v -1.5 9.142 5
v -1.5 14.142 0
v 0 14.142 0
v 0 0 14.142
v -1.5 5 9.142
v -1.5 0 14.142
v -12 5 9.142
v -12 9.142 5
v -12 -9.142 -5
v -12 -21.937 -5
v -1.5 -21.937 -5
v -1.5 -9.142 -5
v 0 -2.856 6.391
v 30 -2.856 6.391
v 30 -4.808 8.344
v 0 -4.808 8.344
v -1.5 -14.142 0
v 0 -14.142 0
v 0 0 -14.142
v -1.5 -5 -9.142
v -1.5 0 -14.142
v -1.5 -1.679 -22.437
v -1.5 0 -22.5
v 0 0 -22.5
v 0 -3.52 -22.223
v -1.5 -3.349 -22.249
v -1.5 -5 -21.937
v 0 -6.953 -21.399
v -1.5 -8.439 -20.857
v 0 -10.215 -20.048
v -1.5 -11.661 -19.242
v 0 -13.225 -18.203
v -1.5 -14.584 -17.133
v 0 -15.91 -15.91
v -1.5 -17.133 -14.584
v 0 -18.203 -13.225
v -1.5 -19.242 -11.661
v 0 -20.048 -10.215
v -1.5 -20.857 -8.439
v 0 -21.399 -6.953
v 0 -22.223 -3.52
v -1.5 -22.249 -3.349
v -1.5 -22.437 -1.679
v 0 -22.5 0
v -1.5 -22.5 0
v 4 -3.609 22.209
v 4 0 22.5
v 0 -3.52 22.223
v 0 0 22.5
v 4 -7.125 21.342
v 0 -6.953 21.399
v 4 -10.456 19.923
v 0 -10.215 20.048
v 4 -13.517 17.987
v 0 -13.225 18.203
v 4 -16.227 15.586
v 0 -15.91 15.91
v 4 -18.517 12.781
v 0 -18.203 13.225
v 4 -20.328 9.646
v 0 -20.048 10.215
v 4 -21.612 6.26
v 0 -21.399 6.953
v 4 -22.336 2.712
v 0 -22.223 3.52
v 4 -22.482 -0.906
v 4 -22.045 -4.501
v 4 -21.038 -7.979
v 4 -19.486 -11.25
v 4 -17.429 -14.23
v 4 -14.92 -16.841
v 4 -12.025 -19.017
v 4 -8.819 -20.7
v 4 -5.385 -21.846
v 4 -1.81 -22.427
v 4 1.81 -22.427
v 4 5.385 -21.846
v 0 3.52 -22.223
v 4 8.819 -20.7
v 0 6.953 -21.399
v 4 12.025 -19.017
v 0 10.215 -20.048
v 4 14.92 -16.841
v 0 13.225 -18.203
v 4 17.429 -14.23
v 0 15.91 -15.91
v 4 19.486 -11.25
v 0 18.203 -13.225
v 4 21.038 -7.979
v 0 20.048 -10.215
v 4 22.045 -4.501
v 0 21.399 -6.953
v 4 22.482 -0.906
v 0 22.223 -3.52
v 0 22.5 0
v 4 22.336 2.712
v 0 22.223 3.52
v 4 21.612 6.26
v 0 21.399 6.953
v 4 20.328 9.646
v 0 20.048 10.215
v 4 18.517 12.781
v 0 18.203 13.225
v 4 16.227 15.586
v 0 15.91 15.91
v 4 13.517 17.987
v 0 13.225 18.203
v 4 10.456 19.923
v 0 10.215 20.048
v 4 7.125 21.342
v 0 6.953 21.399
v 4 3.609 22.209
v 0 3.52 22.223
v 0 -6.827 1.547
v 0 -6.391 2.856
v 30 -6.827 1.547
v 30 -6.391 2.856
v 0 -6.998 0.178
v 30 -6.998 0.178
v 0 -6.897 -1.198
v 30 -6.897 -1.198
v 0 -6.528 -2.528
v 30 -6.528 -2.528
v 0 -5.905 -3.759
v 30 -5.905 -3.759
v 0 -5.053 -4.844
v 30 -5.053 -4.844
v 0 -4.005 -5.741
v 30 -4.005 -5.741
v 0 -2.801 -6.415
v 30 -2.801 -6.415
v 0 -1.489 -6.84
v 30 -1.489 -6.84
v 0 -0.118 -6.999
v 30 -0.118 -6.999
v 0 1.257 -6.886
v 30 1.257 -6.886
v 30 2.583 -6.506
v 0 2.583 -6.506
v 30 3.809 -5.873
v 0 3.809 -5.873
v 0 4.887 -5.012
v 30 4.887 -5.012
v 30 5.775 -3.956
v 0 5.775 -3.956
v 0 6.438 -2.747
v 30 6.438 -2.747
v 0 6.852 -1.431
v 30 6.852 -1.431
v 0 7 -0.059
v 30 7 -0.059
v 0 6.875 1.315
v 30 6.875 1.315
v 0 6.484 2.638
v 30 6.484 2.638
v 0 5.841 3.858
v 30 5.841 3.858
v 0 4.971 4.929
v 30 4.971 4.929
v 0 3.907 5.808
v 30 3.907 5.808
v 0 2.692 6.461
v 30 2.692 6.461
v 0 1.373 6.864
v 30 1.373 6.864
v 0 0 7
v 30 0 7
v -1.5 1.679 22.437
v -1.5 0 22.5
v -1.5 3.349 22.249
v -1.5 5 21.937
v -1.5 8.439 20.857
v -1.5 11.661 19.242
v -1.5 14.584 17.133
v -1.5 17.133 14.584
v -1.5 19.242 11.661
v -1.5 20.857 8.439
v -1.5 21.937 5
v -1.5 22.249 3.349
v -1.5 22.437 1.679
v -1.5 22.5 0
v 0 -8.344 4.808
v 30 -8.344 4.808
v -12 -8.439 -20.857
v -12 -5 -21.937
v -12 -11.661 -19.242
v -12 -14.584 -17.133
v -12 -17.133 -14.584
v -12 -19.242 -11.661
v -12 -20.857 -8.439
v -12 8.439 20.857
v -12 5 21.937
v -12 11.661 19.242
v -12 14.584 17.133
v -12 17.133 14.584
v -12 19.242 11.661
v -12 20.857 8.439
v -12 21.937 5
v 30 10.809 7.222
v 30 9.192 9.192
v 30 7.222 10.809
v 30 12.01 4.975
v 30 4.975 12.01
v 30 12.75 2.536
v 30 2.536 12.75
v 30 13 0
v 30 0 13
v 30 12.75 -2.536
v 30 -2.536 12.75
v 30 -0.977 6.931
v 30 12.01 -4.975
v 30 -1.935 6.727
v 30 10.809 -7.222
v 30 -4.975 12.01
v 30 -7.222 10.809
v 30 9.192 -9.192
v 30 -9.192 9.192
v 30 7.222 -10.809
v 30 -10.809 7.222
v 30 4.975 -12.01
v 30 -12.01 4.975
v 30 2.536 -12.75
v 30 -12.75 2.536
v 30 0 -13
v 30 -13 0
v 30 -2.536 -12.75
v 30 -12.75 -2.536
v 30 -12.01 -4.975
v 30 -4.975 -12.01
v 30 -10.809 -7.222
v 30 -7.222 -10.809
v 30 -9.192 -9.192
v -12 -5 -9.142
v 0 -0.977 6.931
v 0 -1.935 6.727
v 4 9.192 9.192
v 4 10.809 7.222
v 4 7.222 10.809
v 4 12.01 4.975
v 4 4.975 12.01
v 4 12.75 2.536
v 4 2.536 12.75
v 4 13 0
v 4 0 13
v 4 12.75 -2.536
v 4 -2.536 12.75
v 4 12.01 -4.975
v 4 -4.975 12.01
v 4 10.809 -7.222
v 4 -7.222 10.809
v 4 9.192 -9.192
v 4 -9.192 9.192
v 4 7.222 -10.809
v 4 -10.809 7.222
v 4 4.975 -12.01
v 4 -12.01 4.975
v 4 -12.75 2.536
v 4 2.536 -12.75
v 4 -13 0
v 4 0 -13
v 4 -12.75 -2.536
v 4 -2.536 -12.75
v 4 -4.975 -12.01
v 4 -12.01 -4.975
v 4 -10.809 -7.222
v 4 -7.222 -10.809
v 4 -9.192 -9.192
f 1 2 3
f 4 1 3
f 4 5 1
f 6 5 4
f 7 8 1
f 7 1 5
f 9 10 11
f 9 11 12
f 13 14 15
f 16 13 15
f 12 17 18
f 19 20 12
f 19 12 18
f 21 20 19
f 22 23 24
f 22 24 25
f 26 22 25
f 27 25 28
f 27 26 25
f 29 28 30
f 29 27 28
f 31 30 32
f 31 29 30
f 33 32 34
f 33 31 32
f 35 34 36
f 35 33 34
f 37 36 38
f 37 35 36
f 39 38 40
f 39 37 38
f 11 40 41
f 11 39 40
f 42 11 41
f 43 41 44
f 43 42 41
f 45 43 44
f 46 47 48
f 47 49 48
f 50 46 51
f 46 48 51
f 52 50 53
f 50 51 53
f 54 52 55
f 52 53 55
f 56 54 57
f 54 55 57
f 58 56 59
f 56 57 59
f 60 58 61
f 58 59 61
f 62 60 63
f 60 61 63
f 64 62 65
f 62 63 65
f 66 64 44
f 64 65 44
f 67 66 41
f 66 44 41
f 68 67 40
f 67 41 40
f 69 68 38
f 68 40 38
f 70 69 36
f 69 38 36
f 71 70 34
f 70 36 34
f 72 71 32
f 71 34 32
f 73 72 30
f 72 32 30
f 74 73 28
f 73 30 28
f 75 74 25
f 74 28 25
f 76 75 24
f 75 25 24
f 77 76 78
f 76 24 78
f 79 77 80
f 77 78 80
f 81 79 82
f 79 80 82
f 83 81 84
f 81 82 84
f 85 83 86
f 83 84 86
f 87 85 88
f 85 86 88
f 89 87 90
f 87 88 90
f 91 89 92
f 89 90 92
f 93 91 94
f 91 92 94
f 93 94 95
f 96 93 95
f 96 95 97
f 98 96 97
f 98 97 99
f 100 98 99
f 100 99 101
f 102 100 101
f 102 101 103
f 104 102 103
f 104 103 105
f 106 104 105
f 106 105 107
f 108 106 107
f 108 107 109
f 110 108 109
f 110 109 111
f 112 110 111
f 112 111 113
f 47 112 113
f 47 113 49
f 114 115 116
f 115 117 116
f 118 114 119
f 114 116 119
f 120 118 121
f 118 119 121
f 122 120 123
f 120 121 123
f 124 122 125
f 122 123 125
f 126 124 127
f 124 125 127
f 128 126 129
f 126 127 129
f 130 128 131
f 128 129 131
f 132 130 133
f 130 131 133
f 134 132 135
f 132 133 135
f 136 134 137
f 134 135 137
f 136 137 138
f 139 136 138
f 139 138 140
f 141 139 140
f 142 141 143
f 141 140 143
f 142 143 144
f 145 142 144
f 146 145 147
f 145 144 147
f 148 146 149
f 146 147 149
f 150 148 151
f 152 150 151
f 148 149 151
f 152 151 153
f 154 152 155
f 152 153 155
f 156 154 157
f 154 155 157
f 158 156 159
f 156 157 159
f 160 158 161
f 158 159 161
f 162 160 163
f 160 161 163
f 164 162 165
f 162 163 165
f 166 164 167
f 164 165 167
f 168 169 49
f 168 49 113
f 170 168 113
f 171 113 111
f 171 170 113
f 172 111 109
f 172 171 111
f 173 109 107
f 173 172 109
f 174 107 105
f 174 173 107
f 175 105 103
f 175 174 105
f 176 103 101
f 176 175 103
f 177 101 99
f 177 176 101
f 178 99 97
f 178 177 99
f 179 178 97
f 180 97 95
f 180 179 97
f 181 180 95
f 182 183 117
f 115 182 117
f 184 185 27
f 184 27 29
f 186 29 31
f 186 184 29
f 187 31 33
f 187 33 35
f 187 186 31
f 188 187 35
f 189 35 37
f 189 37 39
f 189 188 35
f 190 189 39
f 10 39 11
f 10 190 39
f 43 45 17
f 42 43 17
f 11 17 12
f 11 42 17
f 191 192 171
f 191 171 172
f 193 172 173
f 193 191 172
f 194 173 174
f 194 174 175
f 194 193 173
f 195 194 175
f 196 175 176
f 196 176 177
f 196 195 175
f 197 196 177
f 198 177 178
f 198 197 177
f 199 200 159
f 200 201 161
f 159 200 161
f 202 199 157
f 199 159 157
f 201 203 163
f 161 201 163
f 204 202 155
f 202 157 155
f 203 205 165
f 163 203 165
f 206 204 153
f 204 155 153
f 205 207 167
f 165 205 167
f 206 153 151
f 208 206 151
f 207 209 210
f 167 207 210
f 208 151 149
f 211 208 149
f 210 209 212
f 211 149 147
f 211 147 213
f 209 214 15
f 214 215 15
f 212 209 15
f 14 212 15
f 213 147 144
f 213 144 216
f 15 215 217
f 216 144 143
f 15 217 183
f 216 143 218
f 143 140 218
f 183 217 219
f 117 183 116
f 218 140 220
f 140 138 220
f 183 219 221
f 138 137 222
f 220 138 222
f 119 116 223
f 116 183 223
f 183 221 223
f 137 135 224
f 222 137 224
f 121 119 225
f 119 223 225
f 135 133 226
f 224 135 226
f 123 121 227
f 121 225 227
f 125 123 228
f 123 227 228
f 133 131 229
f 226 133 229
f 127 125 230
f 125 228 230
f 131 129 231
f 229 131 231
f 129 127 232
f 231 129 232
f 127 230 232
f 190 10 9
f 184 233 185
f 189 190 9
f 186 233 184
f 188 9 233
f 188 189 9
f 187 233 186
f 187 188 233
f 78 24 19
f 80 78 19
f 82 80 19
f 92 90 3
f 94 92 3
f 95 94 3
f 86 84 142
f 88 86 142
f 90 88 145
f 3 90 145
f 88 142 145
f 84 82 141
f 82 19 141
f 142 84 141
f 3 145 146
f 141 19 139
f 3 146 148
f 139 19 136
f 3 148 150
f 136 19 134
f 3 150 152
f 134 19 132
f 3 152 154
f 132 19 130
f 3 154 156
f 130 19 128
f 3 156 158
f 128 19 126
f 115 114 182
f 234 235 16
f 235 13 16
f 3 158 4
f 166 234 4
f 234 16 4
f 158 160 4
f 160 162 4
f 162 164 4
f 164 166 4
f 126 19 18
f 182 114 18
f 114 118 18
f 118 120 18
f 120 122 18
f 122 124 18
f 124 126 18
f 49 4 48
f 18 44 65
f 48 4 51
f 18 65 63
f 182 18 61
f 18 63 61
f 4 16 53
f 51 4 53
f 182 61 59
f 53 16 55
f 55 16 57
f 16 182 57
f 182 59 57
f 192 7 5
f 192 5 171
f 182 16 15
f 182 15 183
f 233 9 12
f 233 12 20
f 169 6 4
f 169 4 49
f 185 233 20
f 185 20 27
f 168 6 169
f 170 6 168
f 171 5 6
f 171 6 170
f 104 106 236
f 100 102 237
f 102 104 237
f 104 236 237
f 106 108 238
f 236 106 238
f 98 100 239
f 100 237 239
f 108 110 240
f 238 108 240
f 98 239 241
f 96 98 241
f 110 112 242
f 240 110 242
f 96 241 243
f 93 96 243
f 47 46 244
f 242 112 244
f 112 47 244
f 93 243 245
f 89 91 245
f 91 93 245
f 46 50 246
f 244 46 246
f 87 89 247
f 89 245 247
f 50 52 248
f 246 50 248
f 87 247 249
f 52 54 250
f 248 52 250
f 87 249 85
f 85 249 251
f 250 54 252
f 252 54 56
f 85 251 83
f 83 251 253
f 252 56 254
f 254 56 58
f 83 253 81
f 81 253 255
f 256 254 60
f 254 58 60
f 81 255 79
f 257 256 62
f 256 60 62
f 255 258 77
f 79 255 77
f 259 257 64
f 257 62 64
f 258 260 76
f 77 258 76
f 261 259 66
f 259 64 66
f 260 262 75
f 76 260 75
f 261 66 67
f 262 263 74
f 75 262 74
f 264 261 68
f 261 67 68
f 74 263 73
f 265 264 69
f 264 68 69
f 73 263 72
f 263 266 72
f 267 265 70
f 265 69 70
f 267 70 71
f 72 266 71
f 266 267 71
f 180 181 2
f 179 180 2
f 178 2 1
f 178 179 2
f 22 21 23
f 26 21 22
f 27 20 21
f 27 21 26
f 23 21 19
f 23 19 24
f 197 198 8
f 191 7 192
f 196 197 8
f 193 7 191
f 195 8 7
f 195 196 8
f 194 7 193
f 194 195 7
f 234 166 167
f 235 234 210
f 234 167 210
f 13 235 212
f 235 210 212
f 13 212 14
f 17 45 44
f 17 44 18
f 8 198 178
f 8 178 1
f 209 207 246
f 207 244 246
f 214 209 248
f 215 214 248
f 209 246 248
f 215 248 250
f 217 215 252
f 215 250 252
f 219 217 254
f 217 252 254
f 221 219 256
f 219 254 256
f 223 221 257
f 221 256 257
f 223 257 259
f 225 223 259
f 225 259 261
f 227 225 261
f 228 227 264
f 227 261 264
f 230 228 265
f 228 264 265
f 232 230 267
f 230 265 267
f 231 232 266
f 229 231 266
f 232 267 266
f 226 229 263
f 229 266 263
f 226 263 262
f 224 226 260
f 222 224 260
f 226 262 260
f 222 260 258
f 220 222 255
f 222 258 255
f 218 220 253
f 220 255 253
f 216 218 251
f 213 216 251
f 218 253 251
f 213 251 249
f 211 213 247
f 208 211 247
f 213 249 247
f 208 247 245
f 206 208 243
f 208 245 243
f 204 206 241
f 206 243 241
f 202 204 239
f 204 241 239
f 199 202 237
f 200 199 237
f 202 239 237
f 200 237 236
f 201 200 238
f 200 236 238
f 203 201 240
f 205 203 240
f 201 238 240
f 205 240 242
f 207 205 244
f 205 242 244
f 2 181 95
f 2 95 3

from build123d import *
from build123d.topology import SkipClean

# Parameters (mm, degrees)
EXTRUDE_START            = 1.5
EXTRUDE_4_DEPTH          = 1.5
EXTRUDE_START_2          = 10.5
EXTRUDE_5_DEPTH          = 10.5
PATTERN_CIRCULAR_2_COUNT = 2
CUT_EXTRUDE_3_DEPTH      = 53.692504211


with BuildPart() as part:
    # Эскиз1 → Повернуть1 (revolve)
    with BuildSketch(Plane.XY, mode=Mode.PRIVATE) as revolve_1_sk:
        Polygon((0, 22.5), (0, 7), (30, 7), (30, 13), (4, 13), (4, 22.5), align=None)
    revolve(revolve_1_sk.sketch.rotate(Axis((0, 0, 0), (1, 0, 0)), 90), axis=Axis((0, 0, 0), (1, 0, 0)))

    # Эскиз7 → Бобышка-Вытянуть4 (add)
    with BuildSketch(Plane.ZY.offset(EXTRUDE_START)):
        with BuildLine():
            Line((0, 22.5), (0, 14.142135624))
            Line((0, 14.142135624), (14.142135624, 0))
            Line((14.142135624, 0), (22.5, 0))
            ThreePointArc((22.5, 0), (15.909902577, 15.909902577), (0, 22.5))
        make_face()
    extrude_4 = extrude(amount=-EXTRUDE_4_DEPTH)

    # Эскиз9 → Бобышка-Вытянуть5 (add)
    with BuildSketch(Plane.ZY.offset(1.5).offset(EXTRUDE_START_2)):
        with BuildLine():
            Line((5, 21.937410968), (5, 9.142135624))
            Line((5, 9.142135624), (9.142135624, 5))
            Line((9.142135624, 5), (21.937410968, 5))
            ThreePointArc((21.937410968, 5), (15.909902577, 15.909902577), (5, 21.937410968))
        make_face()
    extrude_5 = extrude(amount=-EXTRUDE_5_DEPTH)

    # Круговой массив2: Бобышка-Вытянуть4, Бобышка-Вытянуть5 ×2 about axis
    with SkipClean():  # the faces are left unmerged after this step: merging them gives an invalid solid
        pattern_circular_2_axis = Axis((0, 0, 0), (1, 0, 0))
        add([extrude_4.rotate(pattern_circular_2_axis, i * 360 / PATTERN_CIRCULAR_2_COUNT) for i in range(1, PATTERN_CIRCULAR_2_COUNT)])
        add([extrude_5.rotate(pattern_circular_2_axis, i * 360 / PATTERN_CIRCULAR_2_COUNT) for i in range(1, PATTERN_CIRCULAR_2_COUNT)])

    # Эскиз10 → Вырез-Вытянуть3 (cut, through all)
    with SkipClean():  # the faces are left unmerged after this step: merging them gives an invalid solid
        with BuildSketch(Plane(origin=(30, 0, 0), x_dir=(0, 0, -1), z_dir=(1, 0, 0))):
            Polygon((1.767766953, -1.767766953), (-1.767766953, 1.767766953), (-8.343860018, -4.808326112), (-4.808326112, -8.343860018), align=None)
        extrude(amount=-CUT_EXTRUDE_3_DEPTH, mode=Mode.SUBTRACT)


solid = part.part
